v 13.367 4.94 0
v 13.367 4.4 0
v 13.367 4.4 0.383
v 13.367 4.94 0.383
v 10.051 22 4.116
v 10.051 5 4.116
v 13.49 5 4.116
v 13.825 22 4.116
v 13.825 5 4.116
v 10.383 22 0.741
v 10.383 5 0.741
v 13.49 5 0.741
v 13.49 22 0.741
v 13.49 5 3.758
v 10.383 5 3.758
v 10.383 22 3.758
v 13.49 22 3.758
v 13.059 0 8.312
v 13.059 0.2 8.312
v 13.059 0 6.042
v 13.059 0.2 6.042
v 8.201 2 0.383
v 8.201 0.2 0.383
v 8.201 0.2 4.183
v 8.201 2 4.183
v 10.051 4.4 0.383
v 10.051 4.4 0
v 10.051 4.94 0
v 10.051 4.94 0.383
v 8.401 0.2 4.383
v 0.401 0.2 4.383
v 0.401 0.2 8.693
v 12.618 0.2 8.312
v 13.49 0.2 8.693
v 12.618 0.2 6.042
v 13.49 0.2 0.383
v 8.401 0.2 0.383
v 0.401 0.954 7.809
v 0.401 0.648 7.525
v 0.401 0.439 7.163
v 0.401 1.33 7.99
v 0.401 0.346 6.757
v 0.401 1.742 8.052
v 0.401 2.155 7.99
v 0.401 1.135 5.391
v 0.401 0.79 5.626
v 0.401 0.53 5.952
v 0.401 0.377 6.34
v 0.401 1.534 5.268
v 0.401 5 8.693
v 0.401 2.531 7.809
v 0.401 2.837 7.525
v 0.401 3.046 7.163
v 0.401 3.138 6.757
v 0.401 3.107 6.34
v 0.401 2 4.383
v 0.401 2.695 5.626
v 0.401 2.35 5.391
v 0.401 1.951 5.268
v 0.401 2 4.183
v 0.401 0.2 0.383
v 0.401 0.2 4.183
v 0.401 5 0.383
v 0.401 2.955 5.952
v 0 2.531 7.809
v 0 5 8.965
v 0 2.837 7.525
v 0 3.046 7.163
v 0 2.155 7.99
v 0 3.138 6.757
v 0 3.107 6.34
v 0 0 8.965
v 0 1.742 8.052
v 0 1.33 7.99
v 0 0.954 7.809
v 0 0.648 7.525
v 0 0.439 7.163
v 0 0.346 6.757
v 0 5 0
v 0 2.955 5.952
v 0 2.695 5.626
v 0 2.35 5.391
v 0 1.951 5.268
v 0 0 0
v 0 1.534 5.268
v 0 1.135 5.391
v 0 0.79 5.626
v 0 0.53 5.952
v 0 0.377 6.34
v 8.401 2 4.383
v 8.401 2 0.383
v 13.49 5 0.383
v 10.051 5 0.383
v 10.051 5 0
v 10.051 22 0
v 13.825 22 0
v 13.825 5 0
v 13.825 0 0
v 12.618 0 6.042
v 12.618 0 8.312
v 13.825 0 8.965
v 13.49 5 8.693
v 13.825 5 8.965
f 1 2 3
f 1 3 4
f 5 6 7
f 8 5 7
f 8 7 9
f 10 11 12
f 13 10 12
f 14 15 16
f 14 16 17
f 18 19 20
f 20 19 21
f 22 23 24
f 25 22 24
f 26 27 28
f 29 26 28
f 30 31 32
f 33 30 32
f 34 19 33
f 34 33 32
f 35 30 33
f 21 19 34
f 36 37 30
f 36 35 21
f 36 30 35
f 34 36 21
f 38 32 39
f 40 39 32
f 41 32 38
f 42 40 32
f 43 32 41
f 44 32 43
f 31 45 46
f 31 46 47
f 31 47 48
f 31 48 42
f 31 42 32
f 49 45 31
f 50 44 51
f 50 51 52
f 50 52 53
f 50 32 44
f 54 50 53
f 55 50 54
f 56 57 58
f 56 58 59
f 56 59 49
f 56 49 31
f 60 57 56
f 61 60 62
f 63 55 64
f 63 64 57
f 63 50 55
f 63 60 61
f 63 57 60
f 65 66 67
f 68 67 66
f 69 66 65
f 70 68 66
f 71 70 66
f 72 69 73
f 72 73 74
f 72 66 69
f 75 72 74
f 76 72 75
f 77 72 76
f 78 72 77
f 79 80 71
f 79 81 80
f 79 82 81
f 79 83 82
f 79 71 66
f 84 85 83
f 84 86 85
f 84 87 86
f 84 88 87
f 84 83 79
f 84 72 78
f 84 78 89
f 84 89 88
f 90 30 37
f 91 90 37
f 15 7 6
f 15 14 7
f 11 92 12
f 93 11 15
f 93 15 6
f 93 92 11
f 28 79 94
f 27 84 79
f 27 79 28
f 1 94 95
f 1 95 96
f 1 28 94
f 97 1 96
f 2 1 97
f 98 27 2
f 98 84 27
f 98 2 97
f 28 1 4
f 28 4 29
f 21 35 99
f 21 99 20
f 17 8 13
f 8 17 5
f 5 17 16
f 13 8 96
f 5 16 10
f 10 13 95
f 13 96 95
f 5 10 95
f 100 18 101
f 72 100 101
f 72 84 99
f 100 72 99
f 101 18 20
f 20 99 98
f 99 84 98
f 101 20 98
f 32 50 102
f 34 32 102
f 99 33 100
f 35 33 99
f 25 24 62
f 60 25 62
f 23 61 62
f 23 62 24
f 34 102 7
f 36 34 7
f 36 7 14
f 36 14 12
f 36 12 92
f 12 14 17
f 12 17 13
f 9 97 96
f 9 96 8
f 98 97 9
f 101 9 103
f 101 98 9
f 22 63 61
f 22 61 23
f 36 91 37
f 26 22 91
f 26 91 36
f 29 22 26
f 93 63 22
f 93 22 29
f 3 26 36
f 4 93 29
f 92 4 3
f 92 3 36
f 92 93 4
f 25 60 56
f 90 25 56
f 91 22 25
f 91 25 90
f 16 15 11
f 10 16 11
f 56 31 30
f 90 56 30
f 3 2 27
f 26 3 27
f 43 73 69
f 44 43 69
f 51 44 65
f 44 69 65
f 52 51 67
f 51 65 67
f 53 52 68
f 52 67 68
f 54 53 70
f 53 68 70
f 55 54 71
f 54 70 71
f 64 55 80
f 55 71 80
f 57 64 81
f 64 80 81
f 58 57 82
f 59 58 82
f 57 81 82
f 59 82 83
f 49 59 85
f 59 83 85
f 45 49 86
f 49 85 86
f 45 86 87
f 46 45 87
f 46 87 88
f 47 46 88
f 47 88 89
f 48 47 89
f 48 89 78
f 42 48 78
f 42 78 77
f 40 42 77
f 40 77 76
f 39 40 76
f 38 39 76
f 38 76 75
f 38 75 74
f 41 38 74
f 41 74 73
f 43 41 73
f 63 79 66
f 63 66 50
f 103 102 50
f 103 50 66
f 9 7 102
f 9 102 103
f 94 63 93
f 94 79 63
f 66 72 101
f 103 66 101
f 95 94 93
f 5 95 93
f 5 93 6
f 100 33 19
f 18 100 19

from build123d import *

# Parameters (mm, degrees)
SKETCH1_W           = 13.824903871
SKETCH1_H           = 8.964949161
BOSS_EXTRUDE1_DEPTH = 5
SKETCH2_W           = 13.088608924
SKETCH2_H           = 8.309427022
CUT_EXTRUDE1_DEPTH  = 4.8
BOSS_EXTRUDE2_DEPTH = 1.8
SKETCH4_R           = 1.4
CUT_EXTRUDE3_DEPTH  = 1.8
SKETCH7_W           = 0.440803266
SKETCH7_H           = 2.270686526
CUT_EXTRUDE4_DEPTH  = 18.162117599
SKETCH9_W           = 3.10665333
SKETCH9_H           = 3.017419
BOSS_EXTRUDE3_DEPTH = 17
SKETCH11_W          = 3.315667702
SKETCH11_H          = 0.539606784
CUT_EXTRUDE11_DEPTH = 1


with BuildPart() as part:
    # Sketch1 → Boss-Extrude1 (new body)
    with BuildSketch(Plane(origin=(0, 0, 0), x_dir=(1, 0, 0), z_dir=(0, 1, 0))):
        with Locations((6.912451936, -4.48247458)):
            Rectangle(SKETCH1_W, SKETCH1_H)
    extrude(amount=BOSS_EXTRUDE1_DEPTH)

    # Sketch2 → Cut-Extrude1 (cut)
    with BuildSketch(Plane(origin=(0, 5, 0), x_dir=(1, 0, 0), z_dir=(0, 1, 0))):
        with Locations((6.945565783, -4.53797661)):
            Rectangle(SKETCH2_W, SKETCH2_H)
    extrude(amount=-CUT_EXTRUDE1_DEPTH, mode=Mode.SUBTRACT)

    # Sketch3 → Boss-Extrude2 (add)
    with BuildSketch(Plane(origin=(0, 0.2, 0), x_dir=(1, 0, 0), z_dir=(0, 1, 0))):
        Polygon((8.401261321, -0.383263099), (8.201261321, -0.383263099), (8.201261321, -4.183263099), (0.401261321, -4.183263099), (0.401261321, -4.383263099), (8.401261321, -4.383263099), align=None)
    extrude(amount=BOSS_EXTRUDE2_DEPTH)

    # Sketch4 → Cut-Extrude3 (cut)
    with BuildSketch(Plane.ZY):
        with Locations((6.651943346, 1.742318178)):
            Circle(SKETCH4_R)
    extrude(amount=-CUT_EXTRUDE3_DEPTH, mode=Mode.SUBTRACT)

    # Sketch7 → Cut-Extrude4 (cut, through all)
    with BuildSketch(Plane(origin=(0, 0.2, 0), x_dir=(1, 0, 0), z_dir=(0, 1, 0))):
        with Locations((12.838352813, -7.176919556)):
            Rectangle(SKETCH7_W, SKETCH7_H)
    extrude(amount=-CUT_EXTRUDE4_DEPTH, mode=Mode.SUBTRACT)

    # Sketch9 → Boss-Extrude3 (add)
    with BuildSketch(Plane(origin=(0, 5, 0), x_dir=(1, 0, 0), z_dir=(0, 1, 0))):
        Polygon((13.489870245, -4.115580834), (10.0509272, -4.115580834), (10.0509272, -0.383263099), (10.0509272, 0), (13.824903871, 0), (13.824903871, -4.115580834), align=None)
        with Locations((11.93654358, -2.24927503)):
            Rectangle(SKETCH9_W, SKETCH9_H, mode=Mode.SUBTRACT)
    extrude(amount=BOSS_EXTRUDE3_DEPTH)

    # Sketch11 → Cut-Extrude11 (cut)
    with BuildSketch(Plane(origin=(0, 0, 0), x_dir=(-1, 0, 0), z_dir=(0, 0, -1))):
        with Locations((-11.708761051, 4.669803392)):
            Rectangle(SKETCH11_W, SKETCH11_H)
    extrude(amount=-CUT_EXTRUDE11_DEPTH, mode=Mode.SUBTRACT)


solid = part.part
